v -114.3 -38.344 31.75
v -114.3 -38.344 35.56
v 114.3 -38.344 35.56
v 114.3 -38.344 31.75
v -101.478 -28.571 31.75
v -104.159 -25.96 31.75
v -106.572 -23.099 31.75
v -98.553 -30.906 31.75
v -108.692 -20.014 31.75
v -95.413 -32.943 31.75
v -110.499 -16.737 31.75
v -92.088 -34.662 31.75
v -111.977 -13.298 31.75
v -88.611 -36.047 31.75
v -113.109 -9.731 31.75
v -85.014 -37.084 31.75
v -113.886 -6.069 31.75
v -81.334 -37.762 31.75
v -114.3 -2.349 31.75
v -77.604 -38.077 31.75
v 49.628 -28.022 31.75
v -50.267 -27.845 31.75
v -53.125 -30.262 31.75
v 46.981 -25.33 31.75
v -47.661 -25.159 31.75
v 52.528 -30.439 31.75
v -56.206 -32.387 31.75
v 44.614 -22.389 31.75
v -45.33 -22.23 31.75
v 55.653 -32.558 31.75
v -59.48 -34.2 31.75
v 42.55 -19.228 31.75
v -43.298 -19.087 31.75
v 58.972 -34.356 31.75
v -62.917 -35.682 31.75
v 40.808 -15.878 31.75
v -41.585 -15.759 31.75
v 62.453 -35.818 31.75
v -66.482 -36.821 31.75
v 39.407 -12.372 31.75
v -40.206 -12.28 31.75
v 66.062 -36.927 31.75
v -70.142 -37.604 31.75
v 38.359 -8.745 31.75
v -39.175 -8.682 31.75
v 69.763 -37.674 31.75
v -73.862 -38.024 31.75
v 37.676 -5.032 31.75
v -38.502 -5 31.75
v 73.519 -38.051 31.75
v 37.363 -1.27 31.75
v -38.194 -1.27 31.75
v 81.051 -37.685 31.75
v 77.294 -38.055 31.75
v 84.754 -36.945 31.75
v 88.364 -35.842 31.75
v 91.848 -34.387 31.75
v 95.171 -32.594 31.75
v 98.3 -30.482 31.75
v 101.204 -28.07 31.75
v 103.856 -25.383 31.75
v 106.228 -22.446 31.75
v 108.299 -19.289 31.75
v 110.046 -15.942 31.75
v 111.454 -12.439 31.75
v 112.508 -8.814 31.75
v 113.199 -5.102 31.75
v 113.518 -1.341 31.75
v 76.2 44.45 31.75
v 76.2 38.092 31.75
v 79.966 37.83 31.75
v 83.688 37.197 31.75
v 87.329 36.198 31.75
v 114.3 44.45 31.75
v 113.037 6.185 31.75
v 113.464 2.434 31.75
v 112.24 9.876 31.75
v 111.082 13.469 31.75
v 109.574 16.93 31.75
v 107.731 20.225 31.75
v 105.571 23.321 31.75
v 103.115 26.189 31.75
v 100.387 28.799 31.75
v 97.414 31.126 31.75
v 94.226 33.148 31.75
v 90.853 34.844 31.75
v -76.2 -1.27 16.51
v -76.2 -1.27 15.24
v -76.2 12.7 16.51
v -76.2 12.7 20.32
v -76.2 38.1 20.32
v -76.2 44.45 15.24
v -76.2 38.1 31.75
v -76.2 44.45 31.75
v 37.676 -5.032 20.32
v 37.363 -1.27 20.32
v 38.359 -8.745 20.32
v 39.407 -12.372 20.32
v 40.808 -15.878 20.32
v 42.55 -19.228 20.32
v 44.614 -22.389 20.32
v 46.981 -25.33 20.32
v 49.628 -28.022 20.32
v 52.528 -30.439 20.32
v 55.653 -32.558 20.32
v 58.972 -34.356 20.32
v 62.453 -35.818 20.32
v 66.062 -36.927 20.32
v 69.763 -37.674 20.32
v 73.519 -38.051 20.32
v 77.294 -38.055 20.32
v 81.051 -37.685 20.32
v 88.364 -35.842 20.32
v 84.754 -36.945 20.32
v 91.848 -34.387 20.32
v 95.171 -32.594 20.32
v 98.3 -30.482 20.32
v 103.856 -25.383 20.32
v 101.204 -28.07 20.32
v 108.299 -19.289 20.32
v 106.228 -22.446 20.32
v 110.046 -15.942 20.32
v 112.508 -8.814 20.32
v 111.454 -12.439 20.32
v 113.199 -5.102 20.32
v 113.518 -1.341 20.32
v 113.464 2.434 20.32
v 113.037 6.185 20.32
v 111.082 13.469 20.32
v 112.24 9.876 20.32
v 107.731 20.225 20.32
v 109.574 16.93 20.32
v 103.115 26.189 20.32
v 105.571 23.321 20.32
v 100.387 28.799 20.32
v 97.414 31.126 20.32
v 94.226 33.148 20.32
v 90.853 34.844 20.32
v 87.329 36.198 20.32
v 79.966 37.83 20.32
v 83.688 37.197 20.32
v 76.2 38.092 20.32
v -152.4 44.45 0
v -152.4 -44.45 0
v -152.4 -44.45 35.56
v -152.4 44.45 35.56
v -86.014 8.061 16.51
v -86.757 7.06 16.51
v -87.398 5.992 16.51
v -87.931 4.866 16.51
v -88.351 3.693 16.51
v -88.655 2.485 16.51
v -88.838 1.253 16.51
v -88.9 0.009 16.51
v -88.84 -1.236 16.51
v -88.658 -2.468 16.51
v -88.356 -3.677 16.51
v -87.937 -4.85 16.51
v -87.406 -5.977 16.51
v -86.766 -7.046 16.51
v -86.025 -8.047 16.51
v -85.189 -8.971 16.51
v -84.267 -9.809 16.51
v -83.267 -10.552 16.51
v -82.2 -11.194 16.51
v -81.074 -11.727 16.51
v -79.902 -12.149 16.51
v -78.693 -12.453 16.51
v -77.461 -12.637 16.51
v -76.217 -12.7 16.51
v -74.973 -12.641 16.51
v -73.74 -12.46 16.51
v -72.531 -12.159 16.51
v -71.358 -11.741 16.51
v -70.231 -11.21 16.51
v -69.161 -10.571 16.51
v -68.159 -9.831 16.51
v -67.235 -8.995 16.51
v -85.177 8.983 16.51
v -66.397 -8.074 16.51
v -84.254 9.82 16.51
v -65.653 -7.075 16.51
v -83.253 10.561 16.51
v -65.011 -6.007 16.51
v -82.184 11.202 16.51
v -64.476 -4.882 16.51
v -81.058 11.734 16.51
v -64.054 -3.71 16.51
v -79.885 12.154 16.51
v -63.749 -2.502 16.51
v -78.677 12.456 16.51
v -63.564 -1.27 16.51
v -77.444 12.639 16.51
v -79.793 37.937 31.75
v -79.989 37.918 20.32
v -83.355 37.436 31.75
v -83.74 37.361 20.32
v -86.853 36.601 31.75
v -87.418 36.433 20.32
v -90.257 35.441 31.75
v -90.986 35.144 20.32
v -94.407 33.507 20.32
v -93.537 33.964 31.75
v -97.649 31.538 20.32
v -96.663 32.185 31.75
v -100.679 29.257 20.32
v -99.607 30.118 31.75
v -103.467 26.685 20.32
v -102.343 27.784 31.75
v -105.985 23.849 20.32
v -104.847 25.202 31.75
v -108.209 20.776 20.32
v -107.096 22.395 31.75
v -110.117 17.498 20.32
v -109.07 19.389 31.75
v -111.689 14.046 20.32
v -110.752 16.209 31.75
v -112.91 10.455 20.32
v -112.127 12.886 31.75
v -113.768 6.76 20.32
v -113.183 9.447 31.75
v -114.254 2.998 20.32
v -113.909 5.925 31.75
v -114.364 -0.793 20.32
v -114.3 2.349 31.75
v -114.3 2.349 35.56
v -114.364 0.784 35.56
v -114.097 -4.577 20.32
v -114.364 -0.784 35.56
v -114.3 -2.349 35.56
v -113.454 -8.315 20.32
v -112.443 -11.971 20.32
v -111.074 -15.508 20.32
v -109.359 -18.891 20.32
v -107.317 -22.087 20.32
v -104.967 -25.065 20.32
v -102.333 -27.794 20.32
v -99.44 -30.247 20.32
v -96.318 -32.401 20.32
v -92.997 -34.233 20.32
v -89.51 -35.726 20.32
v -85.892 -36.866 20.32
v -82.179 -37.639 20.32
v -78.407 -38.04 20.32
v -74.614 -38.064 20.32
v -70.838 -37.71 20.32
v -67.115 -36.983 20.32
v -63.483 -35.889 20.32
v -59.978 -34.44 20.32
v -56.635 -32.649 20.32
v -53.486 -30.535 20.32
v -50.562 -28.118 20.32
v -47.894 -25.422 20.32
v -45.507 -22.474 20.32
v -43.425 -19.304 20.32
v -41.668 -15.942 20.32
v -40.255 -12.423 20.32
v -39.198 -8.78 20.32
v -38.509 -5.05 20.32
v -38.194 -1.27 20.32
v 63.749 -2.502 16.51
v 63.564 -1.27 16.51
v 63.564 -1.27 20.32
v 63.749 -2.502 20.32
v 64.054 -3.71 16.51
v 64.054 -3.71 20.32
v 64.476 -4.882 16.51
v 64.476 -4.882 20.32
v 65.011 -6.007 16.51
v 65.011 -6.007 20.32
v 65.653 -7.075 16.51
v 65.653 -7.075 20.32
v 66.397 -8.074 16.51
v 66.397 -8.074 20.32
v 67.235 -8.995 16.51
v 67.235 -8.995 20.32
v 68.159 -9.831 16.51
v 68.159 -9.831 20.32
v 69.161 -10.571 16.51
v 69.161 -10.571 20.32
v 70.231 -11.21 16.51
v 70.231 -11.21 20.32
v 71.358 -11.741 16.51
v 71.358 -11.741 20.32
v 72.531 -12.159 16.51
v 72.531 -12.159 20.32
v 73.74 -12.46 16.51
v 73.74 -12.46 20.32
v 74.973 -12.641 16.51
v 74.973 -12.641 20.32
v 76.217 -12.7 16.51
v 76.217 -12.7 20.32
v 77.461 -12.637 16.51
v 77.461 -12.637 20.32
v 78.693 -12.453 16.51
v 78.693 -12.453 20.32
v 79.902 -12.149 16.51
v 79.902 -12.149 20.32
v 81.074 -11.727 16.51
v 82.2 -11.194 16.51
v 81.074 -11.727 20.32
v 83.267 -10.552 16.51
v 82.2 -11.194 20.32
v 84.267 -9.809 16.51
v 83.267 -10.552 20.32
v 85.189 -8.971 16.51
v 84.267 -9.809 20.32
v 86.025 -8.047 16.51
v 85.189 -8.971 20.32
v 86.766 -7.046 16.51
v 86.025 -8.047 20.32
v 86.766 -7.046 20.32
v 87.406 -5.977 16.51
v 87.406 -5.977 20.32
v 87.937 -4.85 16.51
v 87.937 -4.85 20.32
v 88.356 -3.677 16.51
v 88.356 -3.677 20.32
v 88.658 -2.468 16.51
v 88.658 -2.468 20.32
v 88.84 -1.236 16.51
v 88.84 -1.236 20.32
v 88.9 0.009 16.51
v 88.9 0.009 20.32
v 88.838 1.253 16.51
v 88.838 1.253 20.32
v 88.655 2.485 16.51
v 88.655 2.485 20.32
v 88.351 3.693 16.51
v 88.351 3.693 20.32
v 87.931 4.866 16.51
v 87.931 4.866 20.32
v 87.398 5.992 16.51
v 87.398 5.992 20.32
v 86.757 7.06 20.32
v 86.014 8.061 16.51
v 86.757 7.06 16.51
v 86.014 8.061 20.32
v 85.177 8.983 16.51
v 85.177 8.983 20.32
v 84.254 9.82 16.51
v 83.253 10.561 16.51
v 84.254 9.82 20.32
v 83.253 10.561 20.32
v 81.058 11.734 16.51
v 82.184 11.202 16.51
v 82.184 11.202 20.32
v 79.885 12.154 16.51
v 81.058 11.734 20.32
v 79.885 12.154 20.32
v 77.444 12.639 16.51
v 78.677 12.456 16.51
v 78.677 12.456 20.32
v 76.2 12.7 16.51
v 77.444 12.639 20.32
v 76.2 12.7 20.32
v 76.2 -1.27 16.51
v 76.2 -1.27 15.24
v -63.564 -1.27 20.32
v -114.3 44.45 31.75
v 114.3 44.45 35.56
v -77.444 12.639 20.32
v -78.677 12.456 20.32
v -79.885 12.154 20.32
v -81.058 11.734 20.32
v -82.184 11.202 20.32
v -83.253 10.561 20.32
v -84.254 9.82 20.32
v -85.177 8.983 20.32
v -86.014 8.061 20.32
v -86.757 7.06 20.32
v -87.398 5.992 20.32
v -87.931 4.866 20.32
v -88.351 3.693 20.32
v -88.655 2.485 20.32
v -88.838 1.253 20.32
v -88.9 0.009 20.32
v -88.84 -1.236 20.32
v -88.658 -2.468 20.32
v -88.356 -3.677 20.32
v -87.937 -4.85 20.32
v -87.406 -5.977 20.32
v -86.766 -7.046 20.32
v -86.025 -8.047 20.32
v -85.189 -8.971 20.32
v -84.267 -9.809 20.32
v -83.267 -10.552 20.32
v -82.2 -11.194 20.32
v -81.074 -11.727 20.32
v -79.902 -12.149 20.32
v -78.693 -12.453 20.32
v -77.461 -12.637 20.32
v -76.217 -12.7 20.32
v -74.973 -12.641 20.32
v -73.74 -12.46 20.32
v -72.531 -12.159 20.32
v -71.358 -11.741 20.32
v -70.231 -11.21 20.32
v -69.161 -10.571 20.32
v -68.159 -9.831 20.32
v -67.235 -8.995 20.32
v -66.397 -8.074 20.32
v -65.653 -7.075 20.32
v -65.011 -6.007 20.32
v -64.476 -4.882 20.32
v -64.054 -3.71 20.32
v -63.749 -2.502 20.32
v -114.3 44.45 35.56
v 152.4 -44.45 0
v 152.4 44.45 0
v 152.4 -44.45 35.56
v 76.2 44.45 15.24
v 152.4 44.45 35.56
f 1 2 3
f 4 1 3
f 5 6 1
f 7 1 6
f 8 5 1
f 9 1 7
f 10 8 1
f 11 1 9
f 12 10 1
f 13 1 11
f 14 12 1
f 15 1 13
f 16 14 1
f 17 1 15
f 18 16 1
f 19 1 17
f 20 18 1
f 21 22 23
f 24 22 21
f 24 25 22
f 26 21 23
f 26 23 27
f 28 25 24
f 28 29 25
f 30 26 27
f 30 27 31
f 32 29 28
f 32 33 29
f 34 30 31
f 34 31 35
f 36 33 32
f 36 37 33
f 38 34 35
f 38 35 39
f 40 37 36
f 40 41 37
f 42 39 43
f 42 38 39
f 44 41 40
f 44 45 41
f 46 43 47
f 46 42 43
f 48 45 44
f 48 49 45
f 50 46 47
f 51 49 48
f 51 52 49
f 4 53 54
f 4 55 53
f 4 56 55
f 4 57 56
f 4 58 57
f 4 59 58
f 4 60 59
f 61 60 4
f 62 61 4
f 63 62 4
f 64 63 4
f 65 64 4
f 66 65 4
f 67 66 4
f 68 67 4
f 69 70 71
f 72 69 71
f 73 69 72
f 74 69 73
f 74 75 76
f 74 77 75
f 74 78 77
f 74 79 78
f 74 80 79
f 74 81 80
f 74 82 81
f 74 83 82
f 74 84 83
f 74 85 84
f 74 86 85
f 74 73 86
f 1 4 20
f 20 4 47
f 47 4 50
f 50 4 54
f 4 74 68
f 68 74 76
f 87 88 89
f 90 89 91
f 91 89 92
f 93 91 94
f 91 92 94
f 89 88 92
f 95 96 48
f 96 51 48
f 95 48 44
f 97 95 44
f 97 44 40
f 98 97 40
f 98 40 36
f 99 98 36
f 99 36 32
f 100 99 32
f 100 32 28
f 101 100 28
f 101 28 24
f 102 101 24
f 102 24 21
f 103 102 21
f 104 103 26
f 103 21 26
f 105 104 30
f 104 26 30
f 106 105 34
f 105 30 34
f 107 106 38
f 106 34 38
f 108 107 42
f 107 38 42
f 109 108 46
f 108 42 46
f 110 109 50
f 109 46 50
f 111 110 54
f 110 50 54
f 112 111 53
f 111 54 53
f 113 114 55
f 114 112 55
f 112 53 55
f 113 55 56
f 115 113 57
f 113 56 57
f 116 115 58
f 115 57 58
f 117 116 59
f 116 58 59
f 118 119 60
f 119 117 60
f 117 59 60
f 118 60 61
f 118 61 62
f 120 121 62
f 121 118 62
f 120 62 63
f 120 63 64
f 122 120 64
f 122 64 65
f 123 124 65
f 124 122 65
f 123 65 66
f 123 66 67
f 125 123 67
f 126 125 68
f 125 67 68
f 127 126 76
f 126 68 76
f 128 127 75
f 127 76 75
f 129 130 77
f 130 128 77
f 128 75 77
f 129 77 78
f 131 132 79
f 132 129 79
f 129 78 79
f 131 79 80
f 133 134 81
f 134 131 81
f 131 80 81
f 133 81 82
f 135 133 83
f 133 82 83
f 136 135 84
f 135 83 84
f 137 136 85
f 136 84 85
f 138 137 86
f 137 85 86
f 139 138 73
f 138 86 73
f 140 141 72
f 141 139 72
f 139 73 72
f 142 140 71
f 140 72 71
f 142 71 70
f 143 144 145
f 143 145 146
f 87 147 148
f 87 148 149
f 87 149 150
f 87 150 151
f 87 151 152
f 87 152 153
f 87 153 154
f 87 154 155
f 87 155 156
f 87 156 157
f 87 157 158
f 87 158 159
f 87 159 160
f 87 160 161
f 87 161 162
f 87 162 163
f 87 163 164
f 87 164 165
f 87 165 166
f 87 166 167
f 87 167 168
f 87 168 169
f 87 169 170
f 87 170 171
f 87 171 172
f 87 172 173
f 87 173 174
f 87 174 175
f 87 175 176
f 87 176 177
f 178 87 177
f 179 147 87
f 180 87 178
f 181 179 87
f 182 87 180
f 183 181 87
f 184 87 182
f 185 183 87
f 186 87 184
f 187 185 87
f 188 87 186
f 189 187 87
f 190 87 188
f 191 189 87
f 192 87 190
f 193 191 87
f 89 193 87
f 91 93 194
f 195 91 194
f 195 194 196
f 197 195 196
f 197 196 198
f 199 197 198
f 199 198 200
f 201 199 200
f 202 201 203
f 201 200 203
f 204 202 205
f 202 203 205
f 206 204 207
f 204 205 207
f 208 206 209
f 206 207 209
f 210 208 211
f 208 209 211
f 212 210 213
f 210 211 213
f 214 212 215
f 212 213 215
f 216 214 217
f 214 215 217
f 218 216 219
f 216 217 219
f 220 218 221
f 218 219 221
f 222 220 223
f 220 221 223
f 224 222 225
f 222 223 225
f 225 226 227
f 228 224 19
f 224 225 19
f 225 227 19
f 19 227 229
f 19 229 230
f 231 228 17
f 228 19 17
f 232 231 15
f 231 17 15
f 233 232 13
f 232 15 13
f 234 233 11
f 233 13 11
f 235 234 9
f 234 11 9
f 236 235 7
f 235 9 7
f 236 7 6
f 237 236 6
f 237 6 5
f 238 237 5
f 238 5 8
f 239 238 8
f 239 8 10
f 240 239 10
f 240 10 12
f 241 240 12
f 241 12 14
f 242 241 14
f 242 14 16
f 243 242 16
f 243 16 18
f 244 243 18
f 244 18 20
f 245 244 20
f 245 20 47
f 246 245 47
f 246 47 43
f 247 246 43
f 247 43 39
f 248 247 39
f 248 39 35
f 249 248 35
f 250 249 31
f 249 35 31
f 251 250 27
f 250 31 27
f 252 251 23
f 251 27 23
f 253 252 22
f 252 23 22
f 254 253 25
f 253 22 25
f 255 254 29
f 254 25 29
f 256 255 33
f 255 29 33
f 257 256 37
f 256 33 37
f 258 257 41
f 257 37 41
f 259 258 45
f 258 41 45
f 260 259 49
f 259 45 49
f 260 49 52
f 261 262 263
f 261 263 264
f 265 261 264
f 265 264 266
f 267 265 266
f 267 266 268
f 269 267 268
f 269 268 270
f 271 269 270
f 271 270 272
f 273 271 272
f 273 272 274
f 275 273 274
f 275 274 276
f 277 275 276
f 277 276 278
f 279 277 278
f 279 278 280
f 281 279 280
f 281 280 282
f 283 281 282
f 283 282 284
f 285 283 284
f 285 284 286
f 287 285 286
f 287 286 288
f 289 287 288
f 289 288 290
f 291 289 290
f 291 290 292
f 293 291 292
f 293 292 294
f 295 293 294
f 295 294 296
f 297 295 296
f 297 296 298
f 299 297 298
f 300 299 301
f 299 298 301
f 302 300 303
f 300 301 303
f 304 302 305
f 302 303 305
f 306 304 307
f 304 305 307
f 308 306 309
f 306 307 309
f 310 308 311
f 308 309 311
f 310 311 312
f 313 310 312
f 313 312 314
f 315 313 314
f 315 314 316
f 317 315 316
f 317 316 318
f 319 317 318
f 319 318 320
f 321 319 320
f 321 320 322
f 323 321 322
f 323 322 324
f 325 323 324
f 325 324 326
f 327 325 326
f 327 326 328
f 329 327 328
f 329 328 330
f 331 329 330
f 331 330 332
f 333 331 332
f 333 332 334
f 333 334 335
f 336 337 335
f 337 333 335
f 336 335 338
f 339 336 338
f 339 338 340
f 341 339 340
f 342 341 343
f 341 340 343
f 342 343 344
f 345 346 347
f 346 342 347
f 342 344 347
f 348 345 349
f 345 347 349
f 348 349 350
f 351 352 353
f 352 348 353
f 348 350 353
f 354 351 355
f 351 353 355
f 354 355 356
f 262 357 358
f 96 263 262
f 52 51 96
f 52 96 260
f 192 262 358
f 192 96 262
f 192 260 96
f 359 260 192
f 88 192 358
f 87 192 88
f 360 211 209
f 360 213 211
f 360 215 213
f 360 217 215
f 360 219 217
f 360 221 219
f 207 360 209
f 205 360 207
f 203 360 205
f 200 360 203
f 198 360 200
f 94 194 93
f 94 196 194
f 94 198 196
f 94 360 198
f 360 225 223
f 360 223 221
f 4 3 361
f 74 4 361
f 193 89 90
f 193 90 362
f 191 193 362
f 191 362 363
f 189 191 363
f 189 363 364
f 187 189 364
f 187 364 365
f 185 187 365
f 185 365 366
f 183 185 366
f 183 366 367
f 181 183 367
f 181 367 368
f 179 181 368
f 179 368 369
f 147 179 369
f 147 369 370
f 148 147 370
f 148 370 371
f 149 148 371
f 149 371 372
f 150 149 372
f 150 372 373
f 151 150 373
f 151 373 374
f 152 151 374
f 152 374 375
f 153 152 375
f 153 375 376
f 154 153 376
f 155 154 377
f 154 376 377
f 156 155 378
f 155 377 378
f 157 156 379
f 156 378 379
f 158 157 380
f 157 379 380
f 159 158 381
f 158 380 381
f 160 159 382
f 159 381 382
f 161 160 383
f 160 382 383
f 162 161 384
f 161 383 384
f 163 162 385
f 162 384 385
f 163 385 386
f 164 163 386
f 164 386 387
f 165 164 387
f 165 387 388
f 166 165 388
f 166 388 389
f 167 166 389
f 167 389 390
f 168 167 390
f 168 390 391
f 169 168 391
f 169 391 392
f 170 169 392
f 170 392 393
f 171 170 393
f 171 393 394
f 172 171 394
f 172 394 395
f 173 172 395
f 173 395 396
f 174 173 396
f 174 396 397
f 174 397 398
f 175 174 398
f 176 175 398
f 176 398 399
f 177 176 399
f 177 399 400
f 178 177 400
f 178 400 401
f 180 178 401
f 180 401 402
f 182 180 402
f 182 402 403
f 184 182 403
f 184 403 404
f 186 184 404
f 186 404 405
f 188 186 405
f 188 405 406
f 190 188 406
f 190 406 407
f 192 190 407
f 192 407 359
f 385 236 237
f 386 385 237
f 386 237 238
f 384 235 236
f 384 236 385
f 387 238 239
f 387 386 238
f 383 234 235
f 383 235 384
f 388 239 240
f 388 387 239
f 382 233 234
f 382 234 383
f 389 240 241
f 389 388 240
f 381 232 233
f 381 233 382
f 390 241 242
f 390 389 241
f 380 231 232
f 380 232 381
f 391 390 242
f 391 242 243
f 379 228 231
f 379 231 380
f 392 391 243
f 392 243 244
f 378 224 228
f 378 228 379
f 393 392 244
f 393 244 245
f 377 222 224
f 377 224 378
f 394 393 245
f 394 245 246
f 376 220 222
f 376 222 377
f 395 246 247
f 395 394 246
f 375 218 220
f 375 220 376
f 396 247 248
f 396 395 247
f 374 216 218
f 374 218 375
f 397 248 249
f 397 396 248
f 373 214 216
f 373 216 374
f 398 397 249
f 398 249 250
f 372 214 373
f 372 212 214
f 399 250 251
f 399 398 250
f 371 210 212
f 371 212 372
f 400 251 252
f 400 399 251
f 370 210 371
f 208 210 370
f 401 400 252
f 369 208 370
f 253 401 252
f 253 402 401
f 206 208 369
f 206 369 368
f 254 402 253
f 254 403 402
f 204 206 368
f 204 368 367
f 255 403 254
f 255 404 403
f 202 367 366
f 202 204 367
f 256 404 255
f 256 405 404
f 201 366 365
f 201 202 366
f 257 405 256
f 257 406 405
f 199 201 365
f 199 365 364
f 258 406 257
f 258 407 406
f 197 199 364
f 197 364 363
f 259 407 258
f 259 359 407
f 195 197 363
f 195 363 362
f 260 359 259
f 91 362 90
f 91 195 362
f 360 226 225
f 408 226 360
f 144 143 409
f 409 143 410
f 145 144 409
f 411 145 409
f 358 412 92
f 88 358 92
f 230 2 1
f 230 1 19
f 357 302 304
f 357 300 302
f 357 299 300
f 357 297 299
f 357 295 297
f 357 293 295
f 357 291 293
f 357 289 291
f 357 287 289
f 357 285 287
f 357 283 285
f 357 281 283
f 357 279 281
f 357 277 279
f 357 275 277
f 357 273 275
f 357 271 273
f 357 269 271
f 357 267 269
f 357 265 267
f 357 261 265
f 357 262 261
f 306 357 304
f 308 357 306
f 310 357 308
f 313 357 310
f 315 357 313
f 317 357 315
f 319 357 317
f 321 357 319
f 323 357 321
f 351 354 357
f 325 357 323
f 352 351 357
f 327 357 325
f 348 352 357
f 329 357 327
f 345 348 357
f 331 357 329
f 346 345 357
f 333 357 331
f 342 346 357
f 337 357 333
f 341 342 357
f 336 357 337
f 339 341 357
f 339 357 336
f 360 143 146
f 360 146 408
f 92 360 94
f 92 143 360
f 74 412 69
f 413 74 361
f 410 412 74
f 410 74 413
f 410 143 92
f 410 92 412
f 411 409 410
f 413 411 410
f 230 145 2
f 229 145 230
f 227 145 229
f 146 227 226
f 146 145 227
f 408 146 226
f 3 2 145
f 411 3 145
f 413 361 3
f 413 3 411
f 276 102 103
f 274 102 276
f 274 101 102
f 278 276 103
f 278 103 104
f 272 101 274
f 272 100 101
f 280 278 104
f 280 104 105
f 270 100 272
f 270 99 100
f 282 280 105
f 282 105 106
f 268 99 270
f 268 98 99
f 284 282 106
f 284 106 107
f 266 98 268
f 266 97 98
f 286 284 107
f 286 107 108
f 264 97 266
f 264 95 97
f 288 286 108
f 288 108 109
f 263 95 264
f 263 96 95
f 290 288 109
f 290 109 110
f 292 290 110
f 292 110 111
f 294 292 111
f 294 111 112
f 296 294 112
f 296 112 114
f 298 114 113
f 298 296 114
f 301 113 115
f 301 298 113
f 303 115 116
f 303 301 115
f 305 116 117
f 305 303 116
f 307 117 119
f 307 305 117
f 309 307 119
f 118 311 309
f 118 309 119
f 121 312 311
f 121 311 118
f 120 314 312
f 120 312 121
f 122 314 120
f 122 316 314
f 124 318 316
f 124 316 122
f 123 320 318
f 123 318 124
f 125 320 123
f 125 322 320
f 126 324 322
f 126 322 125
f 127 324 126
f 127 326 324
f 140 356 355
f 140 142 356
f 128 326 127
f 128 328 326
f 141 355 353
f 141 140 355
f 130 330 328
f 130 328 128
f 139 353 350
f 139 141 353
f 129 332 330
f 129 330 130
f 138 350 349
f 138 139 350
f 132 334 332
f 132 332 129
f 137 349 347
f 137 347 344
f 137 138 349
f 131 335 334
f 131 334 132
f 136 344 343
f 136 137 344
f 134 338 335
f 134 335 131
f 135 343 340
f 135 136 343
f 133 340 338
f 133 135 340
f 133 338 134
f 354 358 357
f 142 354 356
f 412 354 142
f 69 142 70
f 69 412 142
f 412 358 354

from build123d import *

# Parameters (mm, degrees)
F0_W      = 304.8
F0_H      = 88.9
F1_DEPTH  = 35.56
F2_R      = 38.1
F3_DEPTH  = 15.24
F4_R      = 38.1
F5_DEPTH  = 15.24
F6_W      = 152.4
F6_H      = 20.32
F7_DEPTH  = 45.72
F8_W      = 228.6
F8_H      = 82.7938915014
F9_DEPTH  = 3.81
F10_R     = 12.7
F11_DEPTH = 3.81
F12_R     = 12.7
F13_DEPTH = 3.81


# Not quite as in the source:
# - a feature of the source that left no trace in its solid (it failed there, or was rolled back) is left out


with BuildPart() as f1:
    # F0 (on Top) → F1 (new body)
    with BuildSketch(Plane.XY):
        Rectangle(F0_W, F0_H)
    extrude(amount=F1_DEPTH)

    # F2 (on face) → F3 (cut)
    with BuildSketch(Plane.XY.offset(35.56)):
        with Locations((75.4419565201, 0)):
            Circle(F2_R)
    extrude(amount=-F3_DEPTH, mode=Mode.SUBTRACT)

    # F4 (on face) → F5 (cut)
    with BuildSketch(Plane.XY.offset(35.56)):
        with Locations((-76.2725099921, 0)):
            Circle(F4_R)
    extrude(amount=-F5_DEPTH, mode=Mode.SUBTRACT)

    # F6 (on face) → F7 (cut)
    with BuildSketch(Plane(origin=(0, 44.45, 0), x_dir=(-1, 0, 0), z_dir=(0, 1, 0))):
        with Locations((0, 25.4)):
            Rectangle(F6_W, F6_H)
    extrude(amount=-F7_DEPTH, mode=Mode.SUBTRACT)

    # F8 (on face) → F9 (cut)
    with BuildSketch(Plane.XY.offset(35.56)):
        with Locations((0, 3.0530542493)):
            Rectangle(F8_W, F8_H)
    extrude(amount=-F9_DEPTH, mode=Mode.SUBTRACT)

    # F10 (on face) → F11 (cut)
    with BuildSketch(Plane.XY.offset(20.32)):
        with Locations((-76.2, 0)):
            Circle(F10_R)
    extrude(amount=-F11_DEPTH, mode=Mode.SUBTRACT)

    # F12 (on face) → F13 (cut)
    with BuildSketch(Plane.XY.offset(20.32)):
        with Locations((76.2, 0)):
            Circle(F12_R)
    extrude(amount=-F13_DEPTH, mode=Mode.SUBTRACT)


solid = f1.part
